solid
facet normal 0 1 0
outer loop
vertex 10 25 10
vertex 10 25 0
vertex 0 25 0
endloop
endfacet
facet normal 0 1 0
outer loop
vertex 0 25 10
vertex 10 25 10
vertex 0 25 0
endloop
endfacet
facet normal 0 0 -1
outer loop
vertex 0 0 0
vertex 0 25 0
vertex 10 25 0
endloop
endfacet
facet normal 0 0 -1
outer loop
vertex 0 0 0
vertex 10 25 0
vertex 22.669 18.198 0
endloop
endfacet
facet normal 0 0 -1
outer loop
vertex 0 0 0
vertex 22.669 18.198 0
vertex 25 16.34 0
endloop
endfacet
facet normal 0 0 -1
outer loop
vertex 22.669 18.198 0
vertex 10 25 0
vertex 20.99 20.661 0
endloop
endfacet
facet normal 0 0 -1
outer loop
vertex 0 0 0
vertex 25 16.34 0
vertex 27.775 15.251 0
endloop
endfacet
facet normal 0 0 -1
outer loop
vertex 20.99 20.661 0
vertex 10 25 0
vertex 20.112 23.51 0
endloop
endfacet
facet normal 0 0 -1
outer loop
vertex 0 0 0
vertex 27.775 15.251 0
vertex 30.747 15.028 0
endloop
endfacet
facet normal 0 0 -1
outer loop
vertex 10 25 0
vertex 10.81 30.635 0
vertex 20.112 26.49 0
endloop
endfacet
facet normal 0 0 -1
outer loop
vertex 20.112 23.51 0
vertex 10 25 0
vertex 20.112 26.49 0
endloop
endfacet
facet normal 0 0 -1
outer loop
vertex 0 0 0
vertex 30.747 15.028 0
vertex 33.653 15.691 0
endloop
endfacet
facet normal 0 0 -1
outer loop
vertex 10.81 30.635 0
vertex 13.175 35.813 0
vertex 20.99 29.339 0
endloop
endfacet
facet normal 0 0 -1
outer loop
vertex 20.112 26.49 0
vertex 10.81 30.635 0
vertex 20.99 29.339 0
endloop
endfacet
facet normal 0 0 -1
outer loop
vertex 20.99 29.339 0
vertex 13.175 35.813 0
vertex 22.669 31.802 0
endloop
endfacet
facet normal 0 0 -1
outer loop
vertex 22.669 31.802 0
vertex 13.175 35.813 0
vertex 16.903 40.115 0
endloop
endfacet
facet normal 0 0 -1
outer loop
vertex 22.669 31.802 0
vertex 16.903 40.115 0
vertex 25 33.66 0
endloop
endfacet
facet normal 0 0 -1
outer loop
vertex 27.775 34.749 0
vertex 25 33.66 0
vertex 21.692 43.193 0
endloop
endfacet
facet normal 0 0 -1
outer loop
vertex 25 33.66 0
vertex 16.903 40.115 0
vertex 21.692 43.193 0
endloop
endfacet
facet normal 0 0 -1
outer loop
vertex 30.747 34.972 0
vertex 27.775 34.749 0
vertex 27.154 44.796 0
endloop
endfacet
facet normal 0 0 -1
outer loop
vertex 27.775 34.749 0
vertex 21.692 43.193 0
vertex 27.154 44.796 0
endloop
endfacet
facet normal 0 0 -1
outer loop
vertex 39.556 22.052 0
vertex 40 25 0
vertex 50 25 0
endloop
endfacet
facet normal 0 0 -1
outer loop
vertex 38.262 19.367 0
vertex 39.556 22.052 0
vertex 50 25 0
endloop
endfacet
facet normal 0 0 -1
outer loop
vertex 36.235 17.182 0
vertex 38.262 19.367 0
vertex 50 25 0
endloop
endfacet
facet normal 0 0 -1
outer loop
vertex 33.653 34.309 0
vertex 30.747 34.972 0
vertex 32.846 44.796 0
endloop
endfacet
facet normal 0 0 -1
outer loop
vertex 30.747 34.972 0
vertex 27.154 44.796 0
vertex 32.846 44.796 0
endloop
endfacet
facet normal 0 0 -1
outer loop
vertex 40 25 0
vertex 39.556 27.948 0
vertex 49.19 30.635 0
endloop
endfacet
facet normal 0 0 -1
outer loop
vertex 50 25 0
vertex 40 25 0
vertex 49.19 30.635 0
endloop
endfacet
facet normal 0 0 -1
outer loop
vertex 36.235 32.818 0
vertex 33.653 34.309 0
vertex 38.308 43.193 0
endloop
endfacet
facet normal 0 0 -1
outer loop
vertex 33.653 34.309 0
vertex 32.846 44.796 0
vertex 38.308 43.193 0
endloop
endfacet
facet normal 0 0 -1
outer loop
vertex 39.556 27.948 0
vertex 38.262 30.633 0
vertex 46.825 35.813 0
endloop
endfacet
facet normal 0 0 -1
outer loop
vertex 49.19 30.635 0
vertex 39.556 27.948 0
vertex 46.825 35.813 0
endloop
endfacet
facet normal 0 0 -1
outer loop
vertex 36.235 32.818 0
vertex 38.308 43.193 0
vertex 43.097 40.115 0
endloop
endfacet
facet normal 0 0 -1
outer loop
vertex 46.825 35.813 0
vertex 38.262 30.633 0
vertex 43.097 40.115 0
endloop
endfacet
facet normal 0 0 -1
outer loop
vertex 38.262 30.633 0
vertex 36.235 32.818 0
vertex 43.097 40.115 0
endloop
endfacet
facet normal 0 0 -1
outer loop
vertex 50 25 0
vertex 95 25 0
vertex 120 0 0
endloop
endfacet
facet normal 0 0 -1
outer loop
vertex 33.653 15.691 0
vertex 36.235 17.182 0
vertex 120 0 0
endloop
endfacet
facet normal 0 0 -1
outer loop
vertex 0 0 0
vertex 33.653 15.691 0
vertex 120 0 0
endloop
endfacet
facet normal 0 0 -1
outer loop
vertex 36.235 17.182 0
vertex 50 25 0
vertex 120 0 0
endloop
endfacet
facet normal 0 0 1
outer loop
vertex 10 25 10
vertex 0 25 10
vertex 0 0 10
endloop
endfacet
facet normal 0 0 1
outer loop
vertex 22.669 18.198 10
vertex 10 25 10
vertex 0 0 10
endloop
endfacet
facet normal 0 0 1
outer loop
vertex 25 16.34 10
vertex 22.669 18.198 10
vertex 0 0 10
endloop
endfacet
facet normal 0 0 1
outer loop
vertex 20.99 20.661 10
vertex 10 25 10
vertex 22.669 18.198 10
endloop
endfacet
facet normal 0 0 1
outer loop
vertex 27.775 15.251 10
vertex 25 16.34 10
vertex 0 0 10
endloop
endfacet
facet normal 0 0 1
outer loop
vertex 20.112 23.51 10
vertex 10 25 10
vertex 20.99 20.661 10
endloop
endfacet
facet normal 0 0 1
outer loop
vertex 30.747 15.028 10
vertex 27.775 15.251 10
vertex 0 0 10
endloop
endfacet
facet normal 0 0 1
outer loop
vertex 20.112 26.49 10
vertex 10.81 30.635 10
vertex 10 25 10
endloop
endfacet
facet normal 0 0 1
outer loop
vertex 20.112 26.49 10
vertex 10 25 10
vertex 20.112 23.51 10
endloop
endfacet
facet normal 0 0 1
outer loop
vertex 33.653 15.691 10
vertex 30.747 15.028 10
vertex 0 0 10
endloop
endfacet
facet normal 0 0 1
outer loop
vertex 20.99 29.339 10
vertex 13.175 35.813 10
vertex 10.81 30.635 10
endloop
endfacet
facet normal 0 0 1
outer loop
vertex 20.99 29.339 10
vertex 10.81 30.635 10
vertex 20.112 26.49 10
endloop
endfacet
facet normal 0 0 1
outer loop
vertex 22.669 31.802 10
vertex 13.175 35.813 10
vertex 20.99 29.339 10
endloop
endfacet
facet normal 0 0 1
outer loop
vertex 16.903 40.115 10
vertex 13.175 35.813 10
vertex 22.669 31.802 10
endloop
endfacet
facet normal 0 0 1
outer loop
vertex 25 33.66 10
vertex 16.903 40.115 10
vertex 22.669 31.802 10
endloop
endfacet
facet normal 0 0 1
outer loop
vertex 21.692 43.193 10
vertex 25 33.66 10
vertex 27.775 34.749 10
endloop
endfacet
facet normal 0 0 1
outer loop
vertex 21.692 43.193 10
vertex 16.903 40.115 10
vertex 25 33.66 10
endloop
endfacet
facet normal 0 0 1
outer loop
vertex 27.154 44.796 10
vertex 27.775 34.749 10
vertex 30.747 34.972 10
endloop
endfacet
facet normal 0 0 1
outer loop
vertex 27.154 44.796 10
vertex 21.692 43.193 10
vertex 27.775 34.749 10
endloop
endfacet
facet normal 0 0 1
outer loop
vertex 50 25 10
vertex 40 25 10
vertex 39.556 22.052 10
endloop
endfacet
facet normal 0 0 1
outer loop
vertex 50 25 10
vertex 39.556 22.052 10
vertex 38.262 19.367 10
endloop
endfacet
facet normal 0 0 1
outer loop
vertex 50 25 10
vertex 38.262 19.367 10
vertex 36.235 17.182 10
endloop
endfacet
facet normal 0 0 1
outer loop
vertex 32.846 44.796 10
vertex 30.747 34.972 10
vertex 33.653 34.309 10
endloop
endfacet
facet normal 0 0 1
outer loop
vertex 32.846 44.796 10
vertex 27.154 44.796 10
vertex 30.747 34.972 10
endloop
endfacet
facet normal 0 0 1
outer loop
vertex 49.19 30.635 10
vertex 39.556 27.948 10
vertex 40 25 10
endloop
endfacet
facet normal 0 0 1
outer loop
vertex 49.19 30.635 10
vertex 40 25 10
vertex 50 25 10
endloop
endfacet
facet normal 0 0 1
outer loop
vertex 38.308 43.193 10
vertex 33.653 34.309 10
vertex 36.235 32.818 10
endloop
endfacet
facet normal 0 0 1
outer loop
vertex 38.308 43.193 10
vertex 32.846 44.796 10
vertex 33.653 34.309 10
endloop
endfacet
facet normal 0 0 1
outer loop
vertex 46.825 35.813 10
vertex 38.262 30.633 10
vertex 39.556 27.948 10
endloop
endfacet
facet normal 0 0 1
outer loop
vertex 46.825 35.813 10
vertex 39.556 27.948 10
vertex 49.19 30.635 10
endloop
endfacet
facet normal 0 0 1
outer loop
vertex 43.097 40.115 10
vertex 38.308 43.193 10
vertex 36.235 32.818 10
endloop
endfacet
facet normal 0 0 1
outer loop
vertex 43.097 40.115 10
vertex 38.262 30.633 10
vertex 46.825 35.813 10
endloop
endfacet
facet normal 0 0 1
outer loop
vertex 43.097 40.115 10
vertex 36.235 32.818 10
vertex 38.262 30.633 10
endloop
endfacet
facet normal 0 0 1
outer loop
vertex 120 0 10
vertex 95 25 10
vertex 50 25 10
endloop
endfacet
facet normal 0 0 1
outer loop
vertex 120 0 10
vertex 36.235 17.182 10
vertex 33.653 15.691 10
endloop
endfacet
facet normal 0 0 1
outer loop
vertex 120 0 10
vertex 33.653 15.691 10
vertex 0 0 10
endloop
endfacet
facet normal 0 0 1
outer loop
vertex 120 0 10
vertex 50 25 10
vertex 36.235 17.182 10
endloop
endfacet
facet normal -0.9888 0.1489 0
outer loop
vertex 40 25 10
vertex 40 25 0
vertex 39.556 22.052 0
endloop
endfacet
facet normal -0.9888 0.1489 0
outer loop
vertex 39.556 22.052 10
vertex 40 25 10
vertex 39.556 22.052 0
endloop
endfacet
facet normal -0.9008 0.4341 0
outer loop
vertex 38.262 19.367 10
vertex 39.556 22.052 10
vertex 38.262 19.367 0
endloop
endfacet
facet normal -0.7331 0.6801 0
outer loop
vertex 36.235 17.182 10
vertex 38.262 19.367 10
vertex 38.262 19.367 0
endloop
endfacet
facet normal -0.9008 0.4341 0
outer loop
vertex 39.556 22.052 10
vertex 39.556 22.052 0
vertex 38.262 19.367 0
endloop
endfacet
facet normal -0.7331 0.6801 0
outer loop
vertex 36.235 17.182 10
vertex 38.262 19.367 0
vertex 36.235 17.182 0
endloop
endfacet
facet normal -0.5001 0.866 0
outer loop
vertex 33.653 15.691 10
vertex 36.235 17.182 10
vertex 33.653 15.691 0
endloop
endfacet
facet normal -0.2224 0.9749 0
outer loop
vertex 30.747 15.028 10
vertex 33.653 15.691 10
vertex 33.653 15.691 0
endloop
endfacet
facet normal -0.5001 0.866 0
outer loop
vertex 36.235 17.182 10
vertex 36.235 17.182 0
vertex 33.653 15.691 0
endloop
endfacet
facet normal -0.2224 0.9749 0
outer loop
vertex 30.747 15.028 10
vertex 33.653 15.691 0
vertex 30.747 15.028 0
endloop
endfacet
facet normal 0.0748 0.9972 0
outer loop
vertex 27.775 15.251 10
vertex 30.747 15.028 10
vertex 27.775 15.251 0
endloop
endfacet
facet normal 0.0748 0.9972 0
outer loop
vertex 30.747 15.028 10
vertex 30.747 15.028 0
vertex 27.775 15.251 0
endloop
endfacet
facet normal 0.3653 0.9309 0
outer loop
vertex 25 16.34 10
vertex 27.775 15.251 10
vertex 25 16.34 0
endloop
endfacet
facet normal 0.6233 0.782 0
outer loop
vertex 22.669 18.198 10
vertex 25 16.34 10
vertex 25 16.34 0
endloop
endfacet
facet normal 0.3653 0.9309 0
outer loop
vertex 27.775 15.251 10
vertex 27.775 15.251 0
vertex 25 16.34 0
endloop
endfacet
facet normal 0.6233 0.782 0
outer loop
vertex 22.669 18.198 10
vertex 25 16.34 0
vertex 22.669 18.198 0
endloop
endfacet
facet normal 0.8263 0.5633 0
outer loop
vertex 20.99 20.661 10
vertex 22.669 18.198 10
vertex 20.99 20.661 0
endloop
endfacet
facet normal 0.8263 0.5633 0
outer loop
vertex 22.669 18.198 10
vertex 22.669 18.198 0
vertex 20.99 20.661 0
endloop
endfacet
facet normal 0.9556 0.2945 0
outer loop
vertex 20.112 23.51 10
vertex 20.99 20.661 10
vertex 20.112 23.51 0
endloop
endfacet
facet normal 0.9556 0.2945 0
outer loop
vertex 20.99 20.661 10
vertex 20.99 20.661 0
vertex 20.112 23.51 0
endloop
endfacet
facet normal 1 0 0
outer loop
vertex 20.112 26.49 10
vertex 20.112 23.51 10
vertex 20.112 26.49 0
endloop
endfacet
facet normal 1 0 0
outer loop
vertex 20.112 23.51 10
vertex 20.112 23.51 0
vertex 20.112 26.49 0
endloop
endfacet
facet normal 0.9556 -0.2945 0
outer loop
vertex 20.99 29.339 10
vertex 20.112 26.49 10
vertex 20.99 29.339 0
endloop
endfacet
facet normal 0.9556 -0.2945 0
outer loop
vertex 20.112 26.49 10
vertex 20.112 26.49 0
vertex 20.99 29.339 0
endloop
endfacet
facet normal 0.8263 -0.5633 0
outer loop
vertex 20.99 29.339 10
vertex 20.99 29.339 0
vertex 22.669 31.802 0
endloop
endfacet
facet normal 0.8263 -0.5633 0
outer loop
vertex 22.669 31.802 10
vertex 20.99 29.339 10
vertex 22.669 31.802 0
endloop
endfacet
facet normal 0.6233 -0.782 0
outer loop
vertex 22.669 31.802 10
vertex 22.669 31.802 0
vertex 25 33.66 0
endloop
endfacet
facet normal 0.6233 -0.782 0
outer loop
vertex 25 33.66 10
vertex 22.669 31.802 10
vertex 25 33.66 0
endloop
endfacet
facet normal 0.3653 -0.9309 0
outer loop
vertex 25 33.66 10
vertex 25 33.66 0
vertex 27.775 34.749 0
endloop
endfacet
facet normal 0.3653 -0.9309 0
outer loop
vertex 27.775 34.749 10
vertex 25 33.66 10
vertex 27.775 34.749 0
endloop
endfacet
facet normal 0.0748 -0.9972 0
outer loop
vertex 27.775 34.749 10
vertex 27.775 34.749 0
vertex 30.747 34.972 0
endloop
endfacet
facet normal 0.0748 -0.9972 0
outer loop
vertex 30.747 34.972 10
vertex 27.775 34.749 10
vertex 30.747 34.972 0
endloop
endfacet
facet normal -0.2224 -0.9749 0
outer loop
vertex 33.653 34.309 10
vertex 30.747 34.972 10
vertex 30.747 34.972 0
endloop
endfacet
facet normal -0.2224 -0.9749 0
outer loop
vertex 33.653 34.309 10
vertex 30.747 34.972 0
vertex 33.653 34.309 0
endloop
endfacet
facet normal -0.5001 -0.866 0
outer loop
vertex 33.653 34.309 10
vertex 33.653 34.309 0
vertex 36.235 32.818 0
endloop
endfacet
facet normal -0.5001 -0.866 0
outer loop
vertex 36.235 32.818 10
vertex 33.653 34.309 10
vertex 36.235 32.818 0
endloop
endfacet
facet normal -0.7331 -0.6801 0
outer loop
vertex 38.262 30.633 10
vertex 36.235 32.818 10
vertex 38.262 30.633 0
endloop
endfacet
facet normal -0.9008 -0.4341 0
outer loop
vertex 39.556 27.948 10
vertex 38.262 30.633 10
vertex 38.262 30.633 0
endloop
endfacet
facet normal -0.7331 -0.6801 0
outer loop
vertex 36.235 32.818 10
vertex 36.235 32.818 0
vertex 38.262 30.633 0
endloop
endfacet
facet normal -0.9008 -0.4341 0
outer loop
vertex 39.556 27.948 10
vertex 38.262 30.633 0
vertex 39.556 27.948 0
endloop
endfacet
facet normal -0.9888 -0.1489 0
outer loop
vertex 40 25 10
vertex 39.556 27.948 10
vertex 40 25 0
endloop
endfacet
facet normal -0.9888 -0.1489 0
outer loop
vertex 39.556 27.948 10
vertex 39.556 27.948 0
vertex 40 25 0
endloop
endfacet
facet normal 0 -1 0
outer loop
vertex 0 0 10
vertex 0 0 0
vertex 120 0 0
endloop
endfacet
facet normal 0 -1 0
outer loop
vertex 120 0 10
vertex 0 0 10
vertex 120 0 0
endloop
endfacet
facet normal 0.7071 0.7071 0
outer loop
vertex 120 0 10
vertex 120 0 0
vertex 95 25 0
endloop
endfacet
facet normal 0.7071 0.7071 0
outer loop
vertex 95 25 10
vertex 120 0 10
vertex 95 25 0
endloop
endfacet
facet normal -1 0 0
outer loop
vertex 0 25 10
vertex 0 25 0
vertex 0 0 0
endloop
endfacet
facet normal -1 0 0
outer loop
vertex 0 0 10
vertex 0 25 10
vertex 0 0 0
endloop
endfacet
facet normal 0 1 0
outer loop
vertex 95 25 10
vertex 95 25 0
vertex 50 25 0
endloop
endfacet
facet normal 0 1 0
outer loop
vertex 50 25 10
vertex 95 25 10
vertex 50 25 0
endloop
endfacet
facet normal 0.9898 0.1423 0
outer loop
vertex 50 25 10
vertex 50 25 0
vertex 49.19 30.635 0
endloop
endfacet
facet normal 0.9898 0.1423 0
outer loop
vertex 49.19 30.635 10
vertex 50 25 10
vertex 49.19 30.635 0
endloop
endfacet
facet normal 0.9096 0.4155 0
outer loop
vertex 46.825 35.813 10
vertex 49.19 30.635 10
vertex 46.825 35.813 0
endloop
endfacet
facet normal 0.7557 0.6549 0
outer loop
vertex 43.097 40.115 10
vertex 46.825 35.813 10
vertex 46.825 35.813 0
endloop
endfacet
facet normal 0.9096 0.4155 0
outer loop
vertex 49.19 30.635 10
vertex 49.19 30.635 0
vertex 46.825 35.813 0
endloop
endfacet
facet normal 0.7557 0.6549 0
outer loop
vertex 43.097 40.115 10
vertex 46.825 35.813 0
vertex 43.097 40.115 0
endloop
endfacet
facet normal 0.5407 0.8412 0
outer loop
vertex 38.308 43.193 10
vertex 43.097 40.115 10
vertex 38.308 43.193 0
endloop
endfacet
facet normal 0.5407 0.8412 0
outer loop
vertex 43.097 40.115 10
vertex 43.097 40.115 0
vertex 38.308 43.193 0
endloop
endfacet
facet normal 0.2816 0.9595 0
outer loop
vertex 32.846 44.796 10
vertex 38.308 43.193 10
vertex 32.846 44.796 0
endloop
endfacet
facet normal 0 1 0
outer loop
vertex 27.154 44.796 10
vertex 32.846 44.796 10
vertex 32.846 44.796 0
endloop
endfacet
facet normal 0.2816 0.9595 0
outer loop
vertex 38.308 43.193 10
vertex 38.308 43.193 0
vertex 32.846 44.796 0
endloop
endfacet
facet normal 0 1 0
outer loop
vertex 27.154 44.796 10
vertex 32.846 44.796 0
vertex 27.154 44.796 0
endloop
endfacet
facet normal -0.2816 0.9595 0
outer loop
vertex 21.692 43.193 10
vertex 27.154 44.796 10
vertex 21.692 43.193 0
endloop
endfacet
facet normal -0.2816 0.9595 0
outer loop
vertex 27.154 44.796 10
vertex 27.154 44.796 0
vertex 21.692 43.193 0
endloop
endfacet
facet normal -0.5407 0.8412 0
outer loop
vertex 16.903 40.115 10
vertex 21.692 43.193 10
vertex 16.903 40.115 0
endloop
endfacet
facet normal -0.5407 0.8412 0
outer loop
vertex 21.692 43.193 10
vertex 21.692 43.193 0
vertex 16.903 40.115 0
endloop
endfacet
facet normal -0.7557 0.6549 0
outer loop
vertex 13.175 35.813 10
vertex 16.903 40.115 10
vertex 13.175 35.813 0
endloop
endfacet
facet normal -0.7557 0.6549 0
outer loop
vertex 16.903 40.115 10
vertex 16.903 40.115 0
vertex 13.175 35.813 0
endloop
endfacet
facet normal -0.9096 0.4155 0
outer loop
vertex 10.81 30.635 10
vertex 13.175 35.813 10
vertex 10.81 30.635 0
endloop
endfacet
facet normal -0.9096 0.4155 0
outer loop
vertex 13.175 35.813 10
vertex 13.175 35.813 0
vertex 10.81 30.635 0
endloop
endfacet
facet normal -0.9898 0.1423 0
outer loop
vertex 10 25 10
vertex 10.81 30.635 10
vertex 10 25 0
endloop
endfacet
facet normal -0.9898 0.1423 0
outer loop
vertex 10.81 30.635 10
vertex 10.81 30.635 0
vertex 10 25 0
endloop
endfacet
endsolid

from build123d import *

# Parameters (mm, degrees)
F1_DEPTH = 10


with BuildPart() as f1:
    # F0 (on Top) → F1 (new body)
    with BuildSketch(Plane.XY):
        with BuildLine():
            Line((0, 25), (0, 0))
            Line((0, 0), (120, 0))
            Line((120, 0), (95, 25))
            Line((95, 25), (50, 25))
            ThreePointArc((50, 25), (30, 45), (10, 25))
            Line((10, 25), (0, 25))
        make_face()
        with BuildLine():
            ThreePointArc((20, 25), (30, 35), (40, 25))
            ThreePointArc((40, 25), (30, 15), (20, 25))
        make_face(mode=Mode.SUBTRACT)
    extrude(amount=F1_DEPTH)


solid = f1.part
